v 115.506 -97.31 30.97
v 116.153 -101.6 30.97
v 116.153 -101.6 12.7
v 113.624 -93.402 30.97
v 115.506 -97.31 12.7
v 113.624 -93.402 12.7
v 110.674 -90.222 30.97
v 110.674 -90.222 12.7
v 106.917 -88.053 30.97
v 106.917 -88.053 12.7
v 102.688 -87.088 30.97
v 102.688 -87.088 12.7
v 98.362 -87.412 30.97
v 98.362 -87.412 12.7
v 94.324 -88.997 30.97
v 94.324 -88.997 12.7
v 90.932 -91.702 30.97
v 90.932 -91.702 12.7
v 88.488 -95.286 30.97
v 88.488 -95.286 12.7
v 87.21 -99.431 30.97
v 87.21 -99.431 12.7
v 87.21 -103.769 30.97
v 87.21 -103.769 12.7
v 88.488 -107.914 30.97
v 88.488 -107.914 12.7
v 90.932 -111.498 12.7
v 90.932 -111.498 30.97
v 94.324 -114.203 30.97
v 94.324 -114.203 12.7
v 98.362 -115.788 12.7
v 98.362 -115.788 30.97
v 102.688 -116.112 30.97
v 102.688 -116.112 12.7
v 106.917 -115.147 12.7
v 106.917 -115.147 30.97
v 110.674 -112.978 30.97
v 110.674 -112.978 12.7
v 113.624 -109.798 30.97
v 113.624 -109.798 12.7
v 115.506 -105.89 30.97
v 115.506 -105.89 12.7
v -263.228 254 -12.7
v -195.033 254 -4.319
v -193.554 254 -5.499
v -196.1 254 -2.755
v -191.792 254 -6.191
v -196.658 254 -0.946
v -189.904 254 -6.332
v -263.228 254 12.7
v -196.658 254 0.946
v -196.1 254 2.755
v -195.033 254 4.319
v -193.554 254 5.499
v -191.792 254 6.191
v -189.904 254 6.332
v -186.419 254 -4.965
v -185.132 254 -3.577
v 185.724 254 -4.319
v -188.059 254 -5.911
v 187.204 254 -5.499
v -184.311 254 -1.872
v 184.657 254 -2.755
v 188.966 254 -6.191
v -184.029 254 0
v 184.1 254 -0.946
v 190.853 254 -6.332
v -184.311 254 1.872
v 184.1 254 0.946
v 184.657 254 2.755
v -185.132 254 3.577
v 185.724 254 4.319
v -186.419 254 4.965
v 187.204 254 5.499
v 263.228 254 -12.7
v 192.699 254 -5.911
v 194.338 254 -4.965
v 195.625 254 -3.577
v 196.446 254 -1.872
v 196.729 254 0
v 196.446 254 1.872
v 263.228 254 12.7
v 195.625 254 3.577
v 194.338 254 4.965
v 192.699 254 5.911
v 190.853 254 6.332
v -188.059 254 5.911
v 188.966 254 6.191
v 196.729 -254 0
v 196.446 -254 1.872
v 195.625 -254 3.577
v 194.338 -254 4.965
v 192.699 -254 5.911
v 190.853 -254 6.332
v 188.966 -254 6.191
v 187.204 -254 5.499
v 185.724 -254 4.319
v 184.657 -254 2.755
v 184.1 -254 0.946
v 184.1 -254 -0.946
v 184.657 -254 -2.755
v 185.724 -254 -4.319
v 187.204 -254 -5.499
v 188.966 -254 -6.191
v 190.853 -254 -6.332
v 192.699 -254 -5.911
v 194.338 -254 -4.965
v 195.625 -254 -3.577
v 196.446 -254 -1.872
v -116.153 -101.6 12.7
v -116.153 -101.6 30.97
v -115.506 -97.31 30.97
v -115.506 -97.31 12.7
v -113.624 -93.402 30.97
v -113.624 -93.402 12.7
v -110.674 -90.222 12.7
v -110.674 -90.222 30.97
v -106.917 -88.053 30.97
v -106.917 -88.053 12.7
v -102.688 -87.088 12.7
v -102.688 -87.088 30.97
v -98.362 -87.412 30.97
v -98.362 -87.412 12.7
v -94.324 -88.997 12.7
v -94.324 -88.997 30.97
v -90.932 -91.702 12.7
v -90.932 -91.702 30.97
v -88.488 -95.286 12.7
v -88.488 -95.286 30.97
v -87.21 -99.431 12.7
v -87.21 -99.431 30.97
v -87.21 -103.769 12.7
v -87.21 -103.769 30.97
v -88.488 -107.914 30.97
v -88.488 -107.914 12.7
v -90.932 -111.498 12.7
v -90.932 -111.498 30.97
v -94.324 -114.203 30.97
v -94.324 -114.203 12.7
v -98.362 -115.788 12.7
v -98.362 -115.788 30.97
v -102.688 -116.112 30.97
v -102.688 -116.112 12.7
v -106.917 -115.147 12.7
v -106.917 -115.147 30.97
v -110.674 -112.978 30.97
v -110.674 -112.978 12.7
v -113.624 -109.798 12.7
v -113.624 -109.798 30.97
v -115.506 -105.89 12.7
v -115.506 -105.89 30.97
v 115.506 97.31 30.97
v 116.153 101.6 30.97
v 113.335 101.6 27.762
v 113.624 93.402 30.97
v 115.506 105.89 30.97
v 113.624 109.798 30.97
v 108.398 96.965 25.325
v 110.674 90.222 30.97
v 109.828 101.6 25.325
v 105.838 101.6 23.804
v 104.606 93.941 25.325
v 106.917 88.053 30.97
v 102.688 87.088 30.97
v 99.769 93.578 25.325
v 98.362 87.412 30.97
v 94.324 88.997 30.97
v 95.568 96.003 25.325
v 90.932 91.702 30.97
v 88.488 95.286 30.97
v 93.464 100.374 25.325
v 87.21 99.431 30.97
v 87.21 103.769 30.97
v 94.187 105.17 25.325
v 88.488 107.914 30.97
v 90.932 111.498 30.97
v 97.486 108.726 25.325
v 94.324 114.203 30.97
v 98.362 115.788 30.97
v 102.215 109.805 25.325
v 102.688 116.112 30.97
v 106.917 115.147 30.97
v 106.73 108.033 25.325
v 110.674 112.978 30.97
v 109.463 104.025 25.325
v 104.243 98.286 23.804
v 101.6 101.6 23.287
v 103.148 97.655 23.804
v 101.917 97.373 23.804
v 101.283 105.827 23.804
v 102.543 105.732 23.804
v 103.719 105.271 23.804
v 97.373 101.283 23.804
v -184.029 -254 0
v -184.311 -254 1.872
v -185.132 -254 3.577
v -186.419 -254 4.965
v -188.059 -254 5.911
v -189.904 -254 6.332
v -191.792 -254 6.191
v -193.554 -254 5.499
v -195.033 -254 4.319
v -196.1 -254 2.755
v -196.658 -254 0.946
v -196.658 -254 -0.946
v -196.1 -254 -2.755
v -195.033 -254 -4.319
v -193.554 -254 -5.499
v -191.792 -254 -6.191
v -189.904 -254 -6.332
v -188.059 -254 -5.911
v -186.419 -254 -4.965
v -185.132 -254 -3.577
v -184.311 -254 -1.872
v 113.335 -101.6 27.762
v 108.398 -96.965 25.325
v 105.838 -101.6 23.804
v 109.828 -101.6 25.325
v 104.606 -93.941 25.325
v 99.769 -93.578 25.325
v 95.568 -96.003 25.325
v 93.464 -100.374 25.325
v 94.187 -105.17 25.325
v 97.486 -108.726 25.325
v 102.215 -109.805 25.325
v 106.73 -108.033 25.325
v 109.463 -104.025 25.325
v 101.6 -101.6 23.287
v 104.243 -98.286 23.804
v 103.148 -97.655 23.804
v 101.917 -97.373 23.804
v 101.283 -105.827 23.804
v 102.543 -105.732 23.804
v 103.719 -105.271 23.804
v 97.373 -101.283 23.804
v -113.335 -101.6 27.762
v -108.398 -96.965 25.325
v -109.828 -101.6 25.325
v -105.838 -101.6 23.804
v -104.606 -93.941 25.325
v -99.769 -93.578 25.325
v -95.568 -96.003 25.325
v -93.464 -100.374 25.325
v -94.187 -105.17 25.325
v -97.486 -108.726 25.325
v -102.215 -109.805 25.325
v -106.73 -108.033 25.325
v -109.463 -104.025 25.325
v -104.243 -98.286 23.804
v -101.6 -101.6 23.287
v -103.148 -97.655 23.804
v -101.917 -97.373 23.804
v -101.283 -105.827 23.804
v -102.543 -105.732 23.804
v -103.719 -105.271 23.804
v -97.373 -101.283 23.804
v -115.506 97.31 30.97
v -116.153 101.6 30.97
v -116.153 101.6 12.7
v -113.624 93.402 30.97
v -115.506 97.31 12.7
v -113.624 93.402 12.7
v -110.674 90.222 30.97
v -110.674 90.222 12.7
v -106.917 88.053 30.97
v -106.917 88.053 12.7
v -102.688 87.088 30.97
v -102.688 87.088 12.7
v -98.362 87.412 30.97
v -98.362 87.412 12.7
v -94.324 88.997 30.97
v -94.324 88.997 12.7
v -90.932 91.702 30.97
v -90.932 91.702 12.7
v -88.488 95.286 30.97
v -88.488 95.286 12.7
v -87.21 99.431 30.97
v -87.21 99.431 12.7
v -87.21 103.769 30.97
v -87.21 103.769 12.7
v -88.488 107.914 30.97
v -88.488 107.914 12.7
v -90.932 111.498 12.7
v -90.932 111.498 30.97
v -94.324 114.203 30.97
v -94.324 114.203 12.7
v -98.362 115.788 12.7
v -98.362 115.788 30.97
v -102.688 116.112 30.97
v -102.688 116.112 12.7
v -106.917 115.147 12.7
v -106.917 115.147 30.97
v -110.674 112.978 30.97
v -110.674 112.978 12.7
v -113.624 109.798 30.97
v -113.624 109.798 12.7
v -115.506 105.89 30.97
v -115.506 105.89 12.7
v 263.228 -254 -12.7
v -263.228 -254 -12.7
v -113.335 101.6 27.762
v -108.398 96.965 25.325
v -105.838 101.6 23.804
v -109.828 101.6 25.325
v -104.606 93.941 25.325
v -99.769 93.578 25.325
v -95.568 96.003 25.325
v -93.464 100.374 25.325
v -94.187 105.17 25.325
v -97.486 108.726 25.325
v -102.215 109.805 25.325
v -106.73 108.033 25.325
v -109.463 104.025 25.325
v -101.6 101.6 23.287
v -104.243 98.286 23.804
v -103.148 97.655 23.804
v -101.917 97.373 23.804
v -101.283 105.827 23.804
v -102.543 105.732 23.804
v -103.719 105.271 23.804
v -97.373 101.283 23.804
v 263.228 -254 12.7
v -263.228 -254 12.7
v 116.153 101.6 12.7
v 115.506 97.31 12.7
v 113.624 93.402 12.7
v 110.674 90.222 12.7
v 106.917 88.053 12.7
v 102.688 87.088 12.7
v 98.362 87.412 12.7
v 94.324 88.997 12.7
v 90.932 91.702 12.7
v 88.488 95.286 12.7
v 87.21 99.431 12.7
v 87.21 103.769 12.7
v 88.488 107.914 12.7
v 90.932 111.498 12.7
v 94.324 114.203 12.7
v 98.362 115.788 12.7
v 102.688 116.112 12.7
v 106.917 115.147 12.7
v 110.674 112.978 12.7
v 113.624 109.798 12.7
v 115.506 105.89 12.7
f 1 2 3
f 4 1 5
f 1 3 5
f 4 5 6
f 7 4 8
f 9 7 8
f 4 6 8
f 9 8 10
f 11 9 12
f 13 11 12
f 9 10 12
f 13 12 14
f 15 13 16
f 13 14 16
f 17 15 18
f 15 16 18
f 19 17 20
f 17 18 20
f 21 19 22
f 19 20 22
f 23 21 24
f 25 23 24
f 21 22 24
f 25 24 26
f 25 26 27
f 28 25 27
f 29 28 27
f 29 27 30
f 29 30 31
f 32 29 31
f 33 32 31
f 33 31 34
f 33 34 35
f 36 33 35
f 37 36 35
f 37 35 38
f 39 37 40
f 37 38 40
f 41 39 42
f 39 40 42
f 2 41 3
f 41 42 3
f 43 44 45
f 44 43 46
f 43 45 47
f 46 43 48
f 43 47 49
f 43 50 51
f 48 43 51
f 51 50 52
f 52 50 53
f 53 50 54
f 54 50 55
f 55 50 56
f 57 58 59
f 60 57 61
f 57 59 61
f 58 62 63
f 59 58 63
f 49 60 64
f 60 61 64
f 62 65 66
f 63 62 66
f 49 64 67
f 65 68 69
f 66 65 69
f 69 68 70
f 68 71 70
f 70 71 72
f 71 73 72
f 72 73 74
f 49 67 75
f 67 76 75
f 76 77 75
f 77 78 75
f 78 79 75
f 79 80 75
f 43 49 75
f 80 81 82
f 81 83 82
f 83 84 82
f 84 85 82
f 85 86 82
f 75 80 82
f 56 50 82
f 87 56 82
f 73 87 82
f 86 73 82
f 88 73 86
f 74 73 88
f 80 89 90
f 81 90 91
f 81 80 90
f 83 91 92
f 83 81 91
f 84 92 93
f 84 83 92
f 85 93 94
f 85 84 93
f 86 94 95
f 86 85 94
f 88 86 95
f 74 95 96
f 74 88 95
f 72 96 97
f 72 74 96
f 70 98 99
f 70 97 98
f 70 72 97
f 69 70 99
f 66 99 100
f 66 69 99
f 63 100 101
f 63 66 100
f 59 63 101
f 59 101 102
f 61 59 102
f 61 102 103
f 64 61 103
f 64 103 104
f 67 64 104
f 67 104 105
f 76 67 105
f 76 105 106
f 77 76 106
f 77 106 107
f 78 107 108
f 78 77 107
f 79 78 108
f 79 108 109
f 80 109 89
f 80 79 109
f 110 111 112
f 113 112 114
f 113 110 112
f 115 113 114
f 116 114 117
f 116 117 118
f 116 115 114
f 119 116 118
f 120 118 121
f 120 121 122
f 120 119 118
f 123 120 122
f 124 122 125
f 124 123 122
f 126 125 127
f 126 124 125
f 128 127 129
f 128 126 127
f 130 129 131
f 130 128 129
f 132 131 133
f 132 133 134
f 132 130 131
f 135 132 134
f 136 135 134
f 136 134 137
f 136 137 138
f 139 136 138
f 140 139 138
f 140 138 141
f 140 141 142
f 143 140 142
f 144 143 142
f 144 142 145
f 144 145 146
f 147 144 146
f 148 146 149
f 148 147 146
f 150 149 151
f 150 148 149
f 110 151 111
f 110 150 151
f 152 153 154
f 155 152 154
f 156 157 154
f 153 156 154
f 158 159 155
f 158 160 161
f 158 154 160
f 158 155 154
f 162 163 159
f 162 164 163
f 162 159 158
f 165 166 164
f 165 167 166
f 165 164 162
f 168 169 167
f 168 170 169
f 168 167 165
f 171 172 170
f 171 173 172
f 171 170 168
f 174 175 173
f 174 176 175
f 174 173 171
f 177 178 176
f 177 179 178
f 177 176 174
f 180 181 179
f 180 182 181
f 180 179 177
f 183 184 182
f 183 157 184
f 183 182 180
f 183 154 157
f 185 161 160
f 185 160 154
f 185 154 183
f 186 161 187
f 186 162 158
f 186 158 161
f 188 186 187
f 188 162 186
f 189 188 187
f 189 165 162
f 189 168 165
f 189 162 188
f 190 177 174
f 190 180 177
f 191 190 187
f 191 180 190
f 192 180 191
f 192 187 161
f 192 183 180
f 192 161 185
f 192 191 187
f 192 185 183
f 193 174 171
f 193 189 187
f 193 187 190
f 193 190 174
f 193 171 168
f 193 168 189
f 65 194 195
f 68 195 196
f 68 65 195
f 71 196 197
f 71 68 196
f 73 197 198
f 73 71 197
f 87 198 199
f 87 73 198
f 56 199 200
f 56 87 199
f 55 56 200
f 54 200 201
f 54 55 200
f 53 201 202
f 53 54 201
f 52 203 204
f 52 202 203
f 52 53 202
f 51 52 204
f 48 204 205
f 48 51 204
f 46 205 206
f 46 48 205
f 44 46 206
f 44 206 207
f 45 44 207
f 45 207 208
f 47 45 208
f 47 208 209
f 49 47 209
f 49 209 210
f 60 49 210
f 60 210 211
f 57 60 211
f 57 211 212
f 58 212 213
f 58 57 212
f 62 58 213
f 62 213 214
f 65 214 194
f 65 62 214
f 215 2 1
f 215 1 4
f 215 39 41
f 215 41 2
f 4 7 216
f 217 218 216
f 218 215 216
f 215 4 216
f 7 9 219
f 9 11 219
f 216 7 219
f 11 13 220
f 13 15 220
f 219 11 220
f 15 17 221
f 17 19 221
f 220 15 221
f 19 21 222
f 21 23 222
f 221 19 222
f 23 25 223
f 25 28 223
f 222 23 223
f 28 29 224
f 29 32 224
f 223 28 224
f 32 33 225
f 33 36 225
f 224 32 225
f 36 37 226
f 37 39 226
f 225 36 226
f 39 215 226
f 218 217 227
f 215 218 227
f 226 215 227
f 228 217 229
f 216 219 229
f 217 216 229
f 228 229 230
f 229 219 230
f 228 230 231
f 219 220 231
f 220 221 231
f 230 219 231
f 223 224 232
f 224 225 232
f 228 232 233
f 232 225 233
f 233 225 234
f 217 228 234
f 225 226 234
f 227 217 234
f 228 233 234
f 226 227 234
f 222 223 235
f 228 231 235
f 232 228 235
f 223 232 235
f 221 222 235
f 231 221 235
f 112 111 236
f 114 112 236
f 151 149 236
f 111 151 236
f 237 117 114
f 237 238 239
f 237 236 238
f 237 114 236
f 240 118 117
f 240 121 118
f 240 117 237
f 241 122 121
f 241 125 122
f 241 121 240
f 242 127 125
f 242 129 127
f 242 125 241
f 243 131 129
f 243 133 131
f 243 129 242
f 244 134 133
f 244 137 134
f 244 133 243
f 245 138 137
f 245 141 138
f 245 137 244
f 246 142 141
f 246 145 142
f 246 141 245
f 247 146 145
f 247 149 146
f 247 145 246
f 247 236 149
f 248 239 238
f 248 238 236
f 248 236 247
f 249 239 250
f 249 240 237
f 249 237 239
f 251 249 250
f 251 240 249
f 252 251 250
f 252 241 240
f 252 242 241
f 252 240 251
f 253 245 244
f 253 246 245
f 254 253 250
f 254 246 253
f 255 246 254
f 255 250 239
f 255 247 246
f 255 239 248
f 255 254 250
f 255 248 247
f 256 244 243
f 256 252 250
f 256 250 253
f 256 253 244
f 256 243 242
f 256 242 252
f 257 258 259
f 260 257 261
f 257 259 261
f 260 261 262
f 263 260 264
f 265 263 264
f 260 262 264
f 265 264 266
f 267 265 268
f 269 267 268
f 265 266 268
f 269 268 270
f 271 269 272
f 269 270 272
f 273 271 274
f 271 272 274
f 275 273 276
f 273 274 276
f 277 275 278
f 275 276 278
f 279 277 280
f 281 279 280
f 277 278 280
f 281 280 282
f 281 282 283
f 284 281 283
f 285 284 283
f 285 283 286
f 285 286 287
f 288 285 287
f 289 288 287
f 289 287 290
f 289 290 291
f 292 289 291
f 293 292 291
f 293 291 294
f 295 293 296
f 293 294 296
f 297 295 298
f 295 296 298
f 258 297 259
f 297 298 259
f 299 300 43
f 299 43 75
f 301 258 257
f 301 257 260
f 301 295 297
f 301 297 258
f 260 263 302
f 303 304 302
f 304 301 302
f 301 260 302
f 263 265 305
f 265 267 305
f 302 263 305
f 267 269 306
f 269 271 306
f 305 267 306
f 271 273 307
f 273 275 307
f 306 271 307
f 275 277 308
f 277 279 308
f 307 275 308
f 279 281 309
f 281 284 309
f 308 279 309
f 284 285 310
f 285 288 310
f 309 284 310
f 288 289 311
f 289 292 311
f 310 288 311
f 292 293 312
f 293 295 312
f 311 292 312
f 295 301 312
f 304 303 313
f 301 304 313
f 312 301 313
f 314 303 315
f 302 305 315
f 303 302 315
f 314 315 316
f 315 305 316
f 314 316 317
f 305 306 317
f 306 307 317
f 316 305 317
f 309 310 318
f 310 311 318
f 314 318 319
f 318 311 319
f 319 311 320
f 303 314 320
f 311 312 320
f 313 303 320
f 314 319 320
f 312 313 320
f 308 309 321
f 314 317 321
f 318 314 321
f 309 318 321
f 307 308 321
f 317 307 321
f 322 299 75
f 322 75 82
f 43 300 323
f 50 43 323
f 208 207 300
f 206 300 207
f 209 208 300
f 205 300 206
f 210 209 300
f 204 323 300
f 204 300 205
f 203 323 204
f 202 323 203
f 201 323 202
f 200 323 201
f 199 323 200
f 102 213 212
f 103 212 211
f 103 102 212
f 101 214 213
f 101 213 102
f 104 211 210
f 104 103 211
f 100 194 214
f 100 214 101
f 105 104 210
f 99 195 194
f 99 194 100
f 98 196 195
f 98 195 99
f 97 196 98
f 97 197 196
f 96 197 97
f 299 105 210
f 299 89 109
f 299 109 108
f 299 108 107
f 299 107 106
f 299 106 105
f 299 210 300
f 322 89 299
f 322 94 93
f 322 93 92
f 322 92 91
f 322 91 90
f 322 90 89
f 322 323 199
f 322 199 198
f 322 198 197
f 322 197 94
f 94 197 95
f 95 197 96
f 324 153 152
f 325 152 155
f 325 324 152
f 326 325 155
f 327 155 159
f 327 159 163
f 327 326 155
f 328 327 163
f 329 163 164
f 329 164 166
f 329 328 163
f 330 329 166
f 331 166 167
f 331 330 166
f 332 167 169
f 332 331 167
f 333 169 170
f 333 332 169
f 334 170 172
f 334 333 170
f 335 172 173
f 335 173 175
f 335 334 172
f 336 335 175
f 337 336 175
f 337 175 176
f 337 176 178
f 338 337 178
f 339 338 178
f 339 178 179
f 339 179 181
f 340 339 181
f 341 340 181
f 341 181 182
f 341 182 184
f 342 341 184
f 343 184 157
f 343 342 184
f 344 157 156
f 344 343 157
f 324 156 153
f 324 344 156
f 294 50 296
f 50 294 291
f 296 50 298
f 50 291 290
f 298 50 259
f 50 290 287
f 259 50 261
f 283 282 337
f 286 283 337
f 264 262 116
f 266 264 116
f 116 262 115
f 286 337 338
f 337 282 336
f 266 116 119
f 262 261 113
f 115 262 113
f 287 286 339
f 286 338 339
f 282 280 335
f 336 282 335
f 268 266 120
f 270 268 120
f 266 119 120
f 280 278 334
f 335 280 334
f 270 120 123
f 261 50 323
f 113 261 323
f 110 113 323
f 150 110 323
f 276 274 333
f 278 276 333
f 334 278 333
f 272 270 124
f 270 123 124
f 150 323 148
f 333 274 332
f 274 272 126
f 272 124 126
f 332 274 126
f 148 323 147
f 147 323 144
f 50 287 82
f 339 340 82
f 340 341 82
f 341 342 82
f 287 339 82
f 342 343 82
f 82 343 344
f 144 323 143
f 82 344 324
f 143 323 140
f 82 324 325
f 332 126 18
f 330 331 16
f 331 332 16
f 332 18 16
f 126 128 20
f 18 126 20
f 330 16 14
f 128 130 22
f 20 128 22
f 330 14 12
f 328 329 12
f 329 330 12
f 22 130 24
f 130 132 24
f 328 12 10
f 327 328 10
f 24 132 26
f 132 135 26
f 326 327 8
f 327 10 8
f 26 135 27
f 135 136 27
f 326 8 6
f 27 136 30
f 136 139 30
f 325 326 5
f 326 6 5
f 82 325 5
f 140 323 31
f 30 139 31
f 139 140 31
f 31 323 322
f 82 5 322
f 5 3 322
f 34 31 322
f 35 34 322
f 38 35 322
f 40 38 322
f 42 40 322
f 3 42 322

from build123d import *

# Parameters (mm, degrees)
F0_W     = 508
F0_H     = 25.4
F0_R     = 6.35
F1_DEPTH = 254


with BuildPart() as f1:
    # F0 (on Front) → F1 (new body, symmetric)
    with BuildSketch(Plane.XZ):
        with Locations((9.227537, 0)):
            Rectangle(F0_W, F0_H)
        with Locations((-190.37859, 0)):
            Circle(F0_R, mode=Mode.SUBTRACT)
        with Locations((190.37859, 0)):
            Circle(F0_R, mode=Mode.SUBTRACT)
    extrude(amount=F1_DEPTH, both=True)

    # F3 (on offset) → F4 (revolve)
    with BuildSketch(Plane.XZ.offset(101.6)):
        with BuildLine():
            ThreePointArc((-101.6, 23.286832), (-109.828136, 25.325427), (-116.152795, 30.969607))
            Line((-116.152795, 30.969607), (-116.152795, 10.770973))
            Line((-116.152795, 10.770973), (-101.6, 10.770973))
            Line((-101.6, 10.770973), (-101.6, 23.286832))
        make_face()
    revolve(axis=Axis((-101.6, -101.6, 17.028903), (0, 0, -1)))

    # F5: F1 across plane


with BuildPart() as f1_1:
    add(f1.part)
    add(f1.part.mirror(Plane.YZ))

    # F6: F1 across plane


with BuildPart() as f1_2:
    add(f1_1.part)
    add(f1_1.part.mirror(Plane.XZ))


solid = f1_2.part
